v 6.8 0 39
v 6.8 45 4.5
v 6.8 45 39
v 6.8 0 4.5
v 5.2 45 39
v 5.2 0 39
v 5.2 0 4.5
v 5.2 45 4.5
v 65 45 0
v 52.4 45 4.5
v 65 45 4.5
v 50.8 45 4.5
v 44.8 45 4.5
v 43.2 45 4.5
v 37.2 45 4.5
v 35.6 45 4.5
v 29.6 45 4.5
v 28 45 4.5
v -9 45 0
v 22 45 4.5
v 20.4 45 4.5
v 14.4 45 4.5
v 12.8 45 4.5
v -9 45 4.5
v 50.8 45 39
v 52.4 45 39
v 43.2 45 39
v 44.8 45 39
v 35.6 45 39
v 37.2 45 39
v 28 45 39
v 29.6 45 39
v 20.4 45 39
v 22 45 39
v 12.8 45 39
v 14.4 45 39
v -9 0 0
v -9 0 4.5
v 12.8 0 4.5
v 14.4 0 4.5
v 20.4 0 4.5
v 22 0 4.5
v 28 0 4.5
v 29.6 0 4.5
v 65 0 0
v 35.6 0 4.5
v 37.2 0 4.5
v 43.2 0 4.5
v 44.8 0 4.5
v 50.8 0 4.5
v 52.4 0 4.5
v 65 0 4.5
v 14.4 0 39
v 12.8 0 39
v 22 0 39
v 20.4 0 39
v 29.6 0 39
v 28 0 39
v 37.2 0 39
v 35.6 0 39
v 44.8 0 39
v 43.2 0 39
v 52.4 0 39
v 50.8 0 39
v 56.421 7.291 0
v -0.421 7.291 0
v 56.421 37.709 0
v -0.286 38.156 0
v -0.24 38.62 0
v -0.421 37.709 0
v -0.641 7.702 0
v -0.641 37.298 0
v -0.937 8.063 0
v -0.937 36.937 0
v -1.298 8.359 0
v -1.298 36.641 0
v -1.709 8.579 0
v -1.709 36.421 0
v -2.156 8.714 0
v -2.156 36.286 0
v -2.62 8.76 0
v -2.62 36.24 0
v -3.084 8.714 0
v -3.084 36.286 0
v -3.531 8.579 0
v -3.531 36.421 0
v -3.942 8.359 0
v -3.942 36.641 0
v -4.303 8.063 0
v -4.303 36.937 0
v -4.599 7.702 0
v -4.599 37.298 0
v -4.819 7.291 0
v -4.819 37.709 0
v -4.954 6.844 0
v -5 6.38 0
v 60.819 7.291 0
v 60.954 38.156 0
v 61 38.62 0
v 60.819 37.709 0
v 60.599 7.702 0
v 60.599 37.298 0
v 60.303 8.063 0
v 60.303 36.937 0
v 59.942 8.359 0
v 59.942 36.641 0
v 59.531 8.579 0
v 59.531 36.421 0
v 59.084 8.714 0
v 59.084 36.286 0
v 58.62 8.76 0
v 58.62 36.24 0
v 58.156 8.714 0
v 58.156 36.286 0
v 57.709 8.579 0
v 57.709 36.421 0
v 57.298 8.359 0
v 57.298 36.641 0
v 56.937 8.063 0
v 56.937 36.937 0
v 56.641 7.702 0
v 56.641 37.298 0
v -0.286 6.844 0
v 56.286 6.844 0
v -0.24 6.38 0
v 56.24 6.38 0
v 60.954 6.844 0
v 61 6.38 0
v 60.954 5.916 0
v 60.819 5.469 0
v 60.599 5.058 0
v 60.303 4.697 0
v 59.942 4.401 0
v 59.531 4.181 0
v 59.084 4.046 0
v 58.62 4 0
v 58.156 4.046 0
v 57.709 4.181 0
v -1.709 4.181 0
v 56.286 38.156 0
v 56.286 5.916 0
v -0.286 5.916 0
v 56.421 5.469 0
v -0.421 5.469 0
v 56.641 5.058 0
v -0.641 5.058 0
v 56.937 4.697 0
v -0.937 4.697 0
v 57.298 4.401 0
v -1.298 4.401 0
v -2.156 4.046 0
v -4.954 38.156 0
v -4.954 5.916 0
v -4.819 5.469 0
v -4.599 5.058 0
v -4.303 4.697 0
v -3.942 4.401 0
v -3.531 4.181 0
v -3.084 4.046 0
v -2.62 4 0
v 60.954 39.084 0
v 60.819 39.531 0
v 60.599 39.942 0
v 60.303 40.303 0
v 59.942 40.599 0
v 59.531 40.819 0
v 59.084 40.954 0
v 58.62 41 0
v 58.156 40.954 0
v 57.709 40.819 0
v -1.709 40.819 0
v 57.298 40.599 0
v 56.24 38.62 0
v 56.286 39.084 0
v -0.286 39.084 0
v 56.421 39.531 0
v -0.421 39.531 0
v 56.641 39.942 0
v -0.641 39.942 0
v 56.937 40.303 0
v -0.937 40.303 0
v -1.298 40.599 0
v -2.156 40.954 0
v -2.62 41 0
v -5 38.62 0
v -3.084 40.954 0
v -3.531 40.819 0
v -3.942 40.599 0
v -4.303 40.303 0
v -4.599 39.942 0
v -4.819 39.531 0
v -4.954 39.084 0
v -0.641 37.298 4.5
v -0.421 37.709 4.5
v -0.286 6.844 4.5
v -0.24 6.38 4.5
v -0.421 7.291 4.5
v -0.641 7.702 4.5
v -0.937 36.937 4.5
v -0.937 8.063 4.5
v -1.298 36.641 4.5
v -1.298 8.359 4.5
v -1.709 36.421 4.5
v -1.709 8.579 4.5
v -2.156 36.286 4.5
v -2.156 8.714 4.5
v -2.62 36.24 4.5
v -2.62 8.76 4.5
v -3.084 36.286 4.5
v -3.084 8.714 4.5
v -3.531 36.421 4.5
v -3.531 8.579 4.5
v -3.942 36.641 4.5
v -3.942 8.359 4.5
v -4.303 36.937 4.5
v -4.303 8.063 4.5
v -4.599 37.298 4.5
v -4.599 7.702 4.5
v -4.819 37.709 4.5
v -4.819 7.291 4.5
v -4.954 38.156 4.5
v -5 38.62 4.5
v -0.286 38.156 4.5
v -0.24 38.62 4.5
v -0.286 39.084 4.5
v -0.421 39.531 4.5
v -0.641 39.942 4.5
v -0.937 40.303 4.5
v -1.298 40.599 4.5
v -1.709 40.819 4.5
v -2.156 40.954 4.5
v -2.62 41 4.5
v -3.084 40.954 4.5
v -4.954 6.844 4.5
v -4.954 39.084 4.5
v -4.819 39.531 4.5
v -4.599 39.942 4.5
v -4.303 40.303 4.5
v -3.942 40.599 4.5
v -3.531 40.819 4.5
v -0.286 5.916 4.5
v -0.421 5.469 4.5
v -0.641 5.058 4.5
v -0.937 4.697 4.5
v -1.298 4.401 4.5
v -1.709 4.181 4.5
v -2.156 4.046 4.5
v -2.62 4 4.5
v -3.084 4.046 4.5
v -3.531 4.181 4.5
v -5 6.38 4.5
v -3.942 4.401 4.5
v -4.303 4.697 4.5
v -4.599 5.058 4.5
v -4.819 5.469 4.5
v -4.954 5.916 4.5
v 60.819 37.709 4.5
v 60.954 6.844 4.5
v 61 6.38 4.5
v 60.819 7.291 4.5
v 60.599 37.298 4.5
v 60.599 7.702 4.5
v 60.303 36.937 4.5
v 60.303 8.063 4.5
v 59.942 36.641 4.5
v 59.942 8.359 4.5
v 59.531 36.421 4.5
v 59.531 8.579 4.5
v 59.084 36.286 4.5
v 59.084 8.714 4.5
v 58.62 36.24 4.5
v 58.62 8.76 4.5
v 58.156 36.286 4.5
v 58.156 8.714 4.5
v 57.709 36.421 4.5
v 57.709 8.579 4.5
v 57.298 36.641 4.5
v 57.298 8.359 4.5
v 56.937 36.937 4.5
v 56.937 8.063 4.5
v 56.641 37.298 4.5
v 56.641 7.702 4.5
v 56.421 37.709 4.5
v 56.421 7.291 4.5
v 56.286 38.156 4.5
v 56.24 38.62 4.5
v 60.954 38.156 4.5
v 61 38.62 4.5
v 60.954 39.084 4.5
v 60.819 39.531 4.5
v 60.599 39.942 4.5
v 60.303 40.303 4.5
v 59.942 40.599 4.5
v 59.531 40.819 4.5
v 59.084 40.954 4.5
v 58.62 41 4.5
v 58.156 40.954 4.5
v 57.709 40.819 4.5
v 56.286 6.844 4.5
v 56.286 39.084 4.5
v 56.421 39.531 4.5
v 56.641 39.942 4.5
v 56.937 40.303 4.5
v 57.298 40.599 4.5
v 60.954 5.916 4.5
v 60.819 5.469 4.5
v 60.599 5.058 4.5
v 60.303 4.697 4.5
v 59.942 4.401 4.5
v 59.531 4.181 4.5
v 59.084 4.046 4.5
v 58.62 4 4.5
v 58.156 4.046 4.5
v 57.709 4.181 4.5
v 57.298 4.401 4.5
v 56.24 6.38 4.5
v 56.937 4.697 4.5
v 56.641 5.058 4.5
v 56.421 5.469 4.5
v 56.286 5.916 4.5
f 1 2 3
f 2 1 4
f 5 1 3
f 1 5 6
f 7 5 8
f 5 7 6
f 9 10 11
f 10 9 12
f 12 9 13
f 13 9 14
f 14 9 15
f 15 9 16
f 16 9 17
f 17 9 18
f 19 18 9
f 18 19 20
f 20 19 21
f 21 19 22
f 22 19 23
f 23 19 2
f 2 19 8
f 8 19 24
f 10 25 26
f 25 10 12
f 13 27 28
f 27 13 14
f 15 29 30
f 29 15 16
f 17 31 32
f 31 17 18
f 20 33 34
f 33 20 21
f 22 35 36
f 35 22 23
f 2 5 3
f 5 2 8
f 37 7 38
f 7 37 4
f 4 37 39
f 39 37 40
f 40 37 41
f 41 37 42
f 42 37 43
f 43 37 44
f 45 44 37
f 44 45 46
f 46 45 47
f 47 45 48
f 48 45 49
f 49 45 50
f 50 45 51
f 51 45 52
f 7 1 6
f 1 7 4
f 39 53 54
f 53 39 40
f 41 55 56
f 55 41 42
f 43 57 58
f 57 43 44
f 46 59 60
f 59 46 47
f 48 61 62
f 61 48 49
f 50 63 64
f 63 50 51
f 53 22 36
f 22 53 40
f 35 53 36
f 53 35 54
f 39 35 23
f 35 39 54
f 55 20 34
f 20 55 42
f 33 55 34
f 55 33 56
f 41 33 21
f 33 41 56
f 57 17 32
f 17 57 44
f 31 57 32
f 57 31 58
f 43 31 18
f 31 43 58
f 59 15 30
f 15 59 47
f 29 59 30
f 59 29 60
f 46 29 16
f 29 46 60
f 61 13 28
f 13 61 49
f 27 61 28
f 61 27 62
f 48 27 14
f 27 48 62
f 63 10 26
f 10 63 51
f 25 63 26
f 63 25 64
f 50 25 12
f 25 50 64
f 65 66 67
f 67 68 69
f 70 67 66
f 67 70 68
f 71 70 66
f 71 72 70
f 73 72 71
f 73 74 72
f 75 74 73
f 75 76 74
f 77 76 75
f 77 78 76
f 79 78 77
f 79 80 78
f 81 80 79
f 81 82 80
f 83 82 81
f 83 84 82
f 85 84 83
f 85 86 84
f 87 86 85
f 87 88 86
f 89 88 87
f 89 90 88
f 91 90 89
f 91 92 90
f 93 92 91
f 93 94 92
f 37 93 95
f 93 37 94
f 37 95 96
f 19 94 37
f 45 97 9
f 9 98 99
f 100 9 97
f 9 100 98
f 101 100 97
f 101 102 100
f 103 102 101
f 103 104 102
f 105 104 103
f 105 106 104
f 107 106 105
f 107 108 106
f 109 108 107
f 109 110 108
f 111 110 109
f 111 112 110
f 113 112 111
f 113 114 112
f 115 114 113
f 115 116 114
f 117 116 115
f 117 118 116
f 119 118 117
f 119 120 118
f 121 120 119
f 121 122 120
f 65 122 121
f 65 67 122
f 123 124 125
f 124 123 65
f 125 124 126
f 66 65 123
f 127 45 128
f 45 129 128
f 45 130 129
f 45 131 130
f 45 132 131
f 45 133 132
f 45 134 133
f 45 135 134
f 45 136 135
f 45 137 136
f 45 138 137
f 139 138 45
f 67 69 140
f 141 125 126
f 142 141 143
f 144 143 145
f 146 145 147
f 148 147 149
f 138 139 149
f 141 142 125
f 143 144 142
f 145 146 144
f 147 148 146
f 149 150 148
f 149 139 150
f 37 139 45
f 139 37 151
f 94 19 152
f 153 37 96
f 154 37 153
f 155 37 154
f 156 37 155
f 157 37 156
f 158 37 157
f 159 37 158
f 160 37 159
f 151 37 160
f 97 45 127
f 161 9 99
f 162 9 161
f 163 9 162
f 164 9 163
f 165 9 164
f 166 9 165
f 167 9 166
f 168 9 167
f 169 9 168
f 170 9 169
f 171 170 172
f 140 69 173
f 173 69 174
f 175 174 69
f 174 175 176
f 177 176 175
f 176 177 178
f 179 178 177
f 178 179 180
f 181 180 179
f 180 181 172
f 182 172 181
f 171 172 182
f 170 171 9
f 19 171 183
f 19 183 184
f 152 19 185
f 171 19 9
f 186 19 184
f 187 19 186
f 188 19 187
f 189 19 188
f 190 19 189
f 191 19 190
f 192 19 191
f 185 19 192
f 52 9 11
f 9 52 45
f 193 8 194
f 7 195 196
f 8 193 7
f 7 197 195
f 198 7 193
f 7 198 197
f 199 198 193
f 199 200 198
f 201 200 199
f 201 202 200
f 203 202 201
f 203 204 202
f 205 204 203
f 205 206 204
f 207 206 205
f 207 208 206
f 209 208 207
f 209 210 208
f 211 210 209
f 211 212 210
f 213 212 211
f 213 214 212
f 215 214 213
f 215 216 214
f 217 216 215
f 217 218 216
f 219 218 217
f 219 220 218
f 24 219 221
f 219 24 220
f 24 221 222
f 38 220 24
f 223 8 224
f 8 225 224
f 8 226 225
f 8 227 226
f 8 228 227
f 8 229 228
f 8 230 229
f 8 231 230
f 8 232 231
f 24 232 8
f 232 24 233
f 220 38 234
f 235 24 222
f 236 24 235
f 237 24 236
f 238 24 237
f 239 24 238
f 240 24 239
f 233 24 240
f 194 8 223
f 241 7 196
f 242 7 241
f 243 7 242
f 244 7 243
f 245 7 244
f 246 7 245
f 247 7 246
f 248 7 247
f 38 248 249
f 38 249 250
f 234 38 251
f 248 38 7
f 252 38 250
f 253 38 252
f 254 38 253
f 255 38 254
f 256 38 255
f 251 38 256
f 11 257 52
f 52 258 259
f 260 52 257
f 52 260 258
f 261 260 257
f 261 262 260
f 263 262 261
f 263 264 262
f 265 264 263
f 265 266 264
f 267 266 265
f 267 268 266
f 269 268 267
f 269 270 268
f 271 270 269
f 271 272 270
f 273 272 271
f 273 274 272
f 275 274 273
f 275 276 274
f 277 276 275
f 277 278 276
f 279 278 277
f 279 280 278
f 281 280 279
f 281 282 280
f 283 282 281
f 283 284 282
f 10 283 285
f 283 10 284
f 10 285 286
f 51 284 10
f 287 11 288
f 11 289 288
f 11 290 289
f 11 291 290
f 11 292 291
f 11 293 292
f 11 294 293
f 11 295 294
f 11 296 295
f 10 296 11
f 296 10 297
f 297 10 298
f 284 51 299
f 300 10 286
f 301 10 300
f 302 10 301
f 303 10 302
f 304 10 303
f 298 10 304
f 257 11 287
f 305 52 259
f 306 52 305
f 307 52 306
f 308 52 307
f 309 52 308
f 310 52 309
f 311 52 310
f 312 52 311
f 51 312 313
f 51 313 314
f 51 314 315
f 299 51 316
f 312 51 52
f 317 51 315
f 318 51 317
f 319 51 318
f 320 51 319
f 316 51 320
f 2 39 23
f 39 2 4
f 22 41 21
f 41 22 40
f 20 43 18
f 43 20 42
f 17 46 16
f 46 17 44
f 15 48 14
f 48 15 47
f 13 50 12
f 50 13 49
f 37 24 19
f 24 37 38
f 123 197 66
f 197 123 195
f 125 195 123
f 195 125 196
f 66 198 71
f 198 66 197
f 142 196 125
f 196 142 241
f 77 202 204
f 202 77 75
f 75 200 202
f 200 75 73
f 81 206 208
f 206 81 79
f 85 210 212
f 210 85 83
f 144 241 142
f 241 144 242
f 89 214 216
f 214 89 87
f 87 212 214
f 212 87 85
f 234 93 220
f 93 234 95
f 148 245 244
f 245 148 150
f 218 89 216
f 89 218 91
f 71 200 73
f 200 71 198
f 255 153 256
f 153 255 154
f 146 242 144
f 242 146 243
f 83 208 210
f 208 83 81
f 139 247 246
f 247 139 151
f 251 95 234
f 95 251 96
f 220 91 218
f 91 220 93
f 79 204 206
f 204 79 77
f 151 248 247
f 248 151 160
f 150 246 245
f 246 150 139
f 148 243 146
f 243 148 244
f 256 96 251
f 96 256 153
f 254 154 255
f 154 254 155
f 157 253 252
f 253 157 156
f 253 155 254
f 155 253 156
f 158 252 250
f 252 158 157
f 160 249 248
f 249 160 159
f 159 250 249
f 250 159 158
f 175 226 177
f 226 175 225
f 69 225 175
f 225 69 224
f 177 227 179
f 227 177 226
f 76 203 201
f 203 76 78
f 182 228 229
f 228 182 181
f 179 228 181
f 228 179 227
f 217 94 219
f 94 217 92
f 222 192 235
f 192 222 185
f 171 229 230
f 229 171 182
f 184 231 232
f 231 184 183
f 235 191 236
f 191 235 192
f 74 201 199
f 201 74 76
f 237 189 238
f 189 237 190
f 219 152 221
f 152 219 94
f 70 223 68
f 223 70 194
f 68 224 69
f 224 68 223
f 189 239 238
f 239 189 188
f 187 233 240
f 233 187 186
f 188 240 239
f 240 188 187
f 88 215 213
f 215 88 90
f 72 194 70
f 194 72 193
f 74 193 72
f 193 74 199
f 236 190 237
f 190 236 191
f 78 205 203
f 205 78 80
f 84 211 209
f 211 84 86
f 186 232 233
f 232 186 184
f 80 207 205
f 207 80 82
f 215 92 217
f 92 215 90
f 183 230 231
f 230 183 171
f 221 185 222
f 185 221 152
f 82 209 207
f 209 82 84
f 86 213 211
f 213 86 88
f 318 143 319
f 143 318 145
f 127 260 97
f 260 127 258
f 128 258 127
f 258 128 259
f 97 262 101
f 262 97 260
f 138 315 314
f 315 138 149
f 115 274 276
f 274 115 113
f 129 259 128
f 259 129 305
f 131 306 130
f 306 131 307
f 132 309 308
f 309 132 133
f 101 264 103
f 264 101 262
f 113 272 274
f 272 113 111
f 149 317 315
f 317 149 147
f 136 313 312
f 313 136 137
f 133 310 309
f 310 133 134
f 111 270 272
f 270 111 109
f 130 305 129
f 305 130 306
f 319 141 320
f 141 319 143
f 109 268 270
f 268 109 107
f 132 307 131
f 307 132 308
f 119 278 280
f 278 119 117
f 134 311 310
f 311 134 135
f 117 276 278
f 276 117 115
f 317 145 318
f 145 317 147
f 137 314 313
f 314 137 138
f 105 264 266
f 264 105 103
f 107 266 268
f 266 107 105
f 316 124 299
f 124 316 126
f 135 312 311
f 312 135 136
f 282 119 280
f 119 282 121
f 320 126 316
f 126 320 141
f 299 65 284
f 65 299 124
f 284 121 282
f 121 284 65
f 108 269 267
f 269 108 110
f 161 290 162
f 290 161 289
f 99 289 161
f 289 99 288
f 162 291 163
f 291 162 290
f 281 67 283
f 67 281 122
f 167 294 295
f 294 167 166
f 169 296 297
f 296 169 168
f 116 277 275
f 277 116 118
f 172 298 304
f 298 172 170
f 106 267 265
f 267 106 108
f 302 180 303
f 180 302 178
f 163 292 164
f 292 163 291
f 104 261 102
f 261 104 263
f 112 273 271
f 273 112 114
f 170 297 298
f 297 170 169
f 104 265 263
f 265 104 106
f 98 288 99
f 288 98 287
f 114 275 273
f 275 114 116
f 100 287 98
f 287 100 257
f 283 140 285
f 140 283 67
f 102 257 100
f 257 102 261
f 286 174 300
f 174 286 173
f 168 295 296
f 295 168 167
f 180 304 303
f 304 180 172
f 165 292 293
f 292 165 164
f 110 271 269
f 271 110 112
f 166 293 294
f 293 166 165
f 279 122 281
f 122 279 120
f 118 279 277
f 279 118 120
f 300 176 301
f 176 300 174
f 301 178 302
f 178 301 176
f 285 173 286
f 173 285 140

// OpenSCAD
$fn = 32;

// ----------------------------------------------------------------------
// Finned heat sink: 56 x 45 mm base, 35 mm fins
// ----------------------------------------------------------------------

// --- parameters (mm) ---
base_w = 56;              // base width
base_d = 45;              // base depth
base_t = 4;               // base thickness
fin_h = 35;               // fin height above the base
holes_d = 4.76;           // fixing holes
hole_x = 30.62;           // hole offset in x
hole_y = 16.12;           // hole offset in y
fin_t = 1.6;              // fin thickness
fin_pitch = 7.6;          // fin pitch
fin_count = 7;            // number of fins
fin_x0 = 5.2;             // first fin offset
flange_w = 74;            // flange plate width
flange_t = 4;             // flange plate thickness

difference() {
  union() {
    cube([base_w, base_d, base_t]);
    for (i = [0 : fin_count - 1]) {
      translate([fin_x0 + i * fin_pitch, 0, base_t - 0.5]) cube([fin_t, base_d, fin_h + 0.5]);
    }
    /* mounting flange, a wider plate sharing the base bottom */
    translate([(base_w - flange_w) / 2, 0, 0]) cube([flange_w, base_d, flange_t + 0.5]);
  }
  /* fixing holes through the base, 2.5 mm clear on both sides */
  for (hx = [-30.62, 30.62]) {
    for (hy = [-16.12, 16.12]) {
      translate([base_w / 2 + hx, base_d / 2 + hy, -2.5]) cylinder(h = base_t + 5, d = holes_d);
    }
  }
}
